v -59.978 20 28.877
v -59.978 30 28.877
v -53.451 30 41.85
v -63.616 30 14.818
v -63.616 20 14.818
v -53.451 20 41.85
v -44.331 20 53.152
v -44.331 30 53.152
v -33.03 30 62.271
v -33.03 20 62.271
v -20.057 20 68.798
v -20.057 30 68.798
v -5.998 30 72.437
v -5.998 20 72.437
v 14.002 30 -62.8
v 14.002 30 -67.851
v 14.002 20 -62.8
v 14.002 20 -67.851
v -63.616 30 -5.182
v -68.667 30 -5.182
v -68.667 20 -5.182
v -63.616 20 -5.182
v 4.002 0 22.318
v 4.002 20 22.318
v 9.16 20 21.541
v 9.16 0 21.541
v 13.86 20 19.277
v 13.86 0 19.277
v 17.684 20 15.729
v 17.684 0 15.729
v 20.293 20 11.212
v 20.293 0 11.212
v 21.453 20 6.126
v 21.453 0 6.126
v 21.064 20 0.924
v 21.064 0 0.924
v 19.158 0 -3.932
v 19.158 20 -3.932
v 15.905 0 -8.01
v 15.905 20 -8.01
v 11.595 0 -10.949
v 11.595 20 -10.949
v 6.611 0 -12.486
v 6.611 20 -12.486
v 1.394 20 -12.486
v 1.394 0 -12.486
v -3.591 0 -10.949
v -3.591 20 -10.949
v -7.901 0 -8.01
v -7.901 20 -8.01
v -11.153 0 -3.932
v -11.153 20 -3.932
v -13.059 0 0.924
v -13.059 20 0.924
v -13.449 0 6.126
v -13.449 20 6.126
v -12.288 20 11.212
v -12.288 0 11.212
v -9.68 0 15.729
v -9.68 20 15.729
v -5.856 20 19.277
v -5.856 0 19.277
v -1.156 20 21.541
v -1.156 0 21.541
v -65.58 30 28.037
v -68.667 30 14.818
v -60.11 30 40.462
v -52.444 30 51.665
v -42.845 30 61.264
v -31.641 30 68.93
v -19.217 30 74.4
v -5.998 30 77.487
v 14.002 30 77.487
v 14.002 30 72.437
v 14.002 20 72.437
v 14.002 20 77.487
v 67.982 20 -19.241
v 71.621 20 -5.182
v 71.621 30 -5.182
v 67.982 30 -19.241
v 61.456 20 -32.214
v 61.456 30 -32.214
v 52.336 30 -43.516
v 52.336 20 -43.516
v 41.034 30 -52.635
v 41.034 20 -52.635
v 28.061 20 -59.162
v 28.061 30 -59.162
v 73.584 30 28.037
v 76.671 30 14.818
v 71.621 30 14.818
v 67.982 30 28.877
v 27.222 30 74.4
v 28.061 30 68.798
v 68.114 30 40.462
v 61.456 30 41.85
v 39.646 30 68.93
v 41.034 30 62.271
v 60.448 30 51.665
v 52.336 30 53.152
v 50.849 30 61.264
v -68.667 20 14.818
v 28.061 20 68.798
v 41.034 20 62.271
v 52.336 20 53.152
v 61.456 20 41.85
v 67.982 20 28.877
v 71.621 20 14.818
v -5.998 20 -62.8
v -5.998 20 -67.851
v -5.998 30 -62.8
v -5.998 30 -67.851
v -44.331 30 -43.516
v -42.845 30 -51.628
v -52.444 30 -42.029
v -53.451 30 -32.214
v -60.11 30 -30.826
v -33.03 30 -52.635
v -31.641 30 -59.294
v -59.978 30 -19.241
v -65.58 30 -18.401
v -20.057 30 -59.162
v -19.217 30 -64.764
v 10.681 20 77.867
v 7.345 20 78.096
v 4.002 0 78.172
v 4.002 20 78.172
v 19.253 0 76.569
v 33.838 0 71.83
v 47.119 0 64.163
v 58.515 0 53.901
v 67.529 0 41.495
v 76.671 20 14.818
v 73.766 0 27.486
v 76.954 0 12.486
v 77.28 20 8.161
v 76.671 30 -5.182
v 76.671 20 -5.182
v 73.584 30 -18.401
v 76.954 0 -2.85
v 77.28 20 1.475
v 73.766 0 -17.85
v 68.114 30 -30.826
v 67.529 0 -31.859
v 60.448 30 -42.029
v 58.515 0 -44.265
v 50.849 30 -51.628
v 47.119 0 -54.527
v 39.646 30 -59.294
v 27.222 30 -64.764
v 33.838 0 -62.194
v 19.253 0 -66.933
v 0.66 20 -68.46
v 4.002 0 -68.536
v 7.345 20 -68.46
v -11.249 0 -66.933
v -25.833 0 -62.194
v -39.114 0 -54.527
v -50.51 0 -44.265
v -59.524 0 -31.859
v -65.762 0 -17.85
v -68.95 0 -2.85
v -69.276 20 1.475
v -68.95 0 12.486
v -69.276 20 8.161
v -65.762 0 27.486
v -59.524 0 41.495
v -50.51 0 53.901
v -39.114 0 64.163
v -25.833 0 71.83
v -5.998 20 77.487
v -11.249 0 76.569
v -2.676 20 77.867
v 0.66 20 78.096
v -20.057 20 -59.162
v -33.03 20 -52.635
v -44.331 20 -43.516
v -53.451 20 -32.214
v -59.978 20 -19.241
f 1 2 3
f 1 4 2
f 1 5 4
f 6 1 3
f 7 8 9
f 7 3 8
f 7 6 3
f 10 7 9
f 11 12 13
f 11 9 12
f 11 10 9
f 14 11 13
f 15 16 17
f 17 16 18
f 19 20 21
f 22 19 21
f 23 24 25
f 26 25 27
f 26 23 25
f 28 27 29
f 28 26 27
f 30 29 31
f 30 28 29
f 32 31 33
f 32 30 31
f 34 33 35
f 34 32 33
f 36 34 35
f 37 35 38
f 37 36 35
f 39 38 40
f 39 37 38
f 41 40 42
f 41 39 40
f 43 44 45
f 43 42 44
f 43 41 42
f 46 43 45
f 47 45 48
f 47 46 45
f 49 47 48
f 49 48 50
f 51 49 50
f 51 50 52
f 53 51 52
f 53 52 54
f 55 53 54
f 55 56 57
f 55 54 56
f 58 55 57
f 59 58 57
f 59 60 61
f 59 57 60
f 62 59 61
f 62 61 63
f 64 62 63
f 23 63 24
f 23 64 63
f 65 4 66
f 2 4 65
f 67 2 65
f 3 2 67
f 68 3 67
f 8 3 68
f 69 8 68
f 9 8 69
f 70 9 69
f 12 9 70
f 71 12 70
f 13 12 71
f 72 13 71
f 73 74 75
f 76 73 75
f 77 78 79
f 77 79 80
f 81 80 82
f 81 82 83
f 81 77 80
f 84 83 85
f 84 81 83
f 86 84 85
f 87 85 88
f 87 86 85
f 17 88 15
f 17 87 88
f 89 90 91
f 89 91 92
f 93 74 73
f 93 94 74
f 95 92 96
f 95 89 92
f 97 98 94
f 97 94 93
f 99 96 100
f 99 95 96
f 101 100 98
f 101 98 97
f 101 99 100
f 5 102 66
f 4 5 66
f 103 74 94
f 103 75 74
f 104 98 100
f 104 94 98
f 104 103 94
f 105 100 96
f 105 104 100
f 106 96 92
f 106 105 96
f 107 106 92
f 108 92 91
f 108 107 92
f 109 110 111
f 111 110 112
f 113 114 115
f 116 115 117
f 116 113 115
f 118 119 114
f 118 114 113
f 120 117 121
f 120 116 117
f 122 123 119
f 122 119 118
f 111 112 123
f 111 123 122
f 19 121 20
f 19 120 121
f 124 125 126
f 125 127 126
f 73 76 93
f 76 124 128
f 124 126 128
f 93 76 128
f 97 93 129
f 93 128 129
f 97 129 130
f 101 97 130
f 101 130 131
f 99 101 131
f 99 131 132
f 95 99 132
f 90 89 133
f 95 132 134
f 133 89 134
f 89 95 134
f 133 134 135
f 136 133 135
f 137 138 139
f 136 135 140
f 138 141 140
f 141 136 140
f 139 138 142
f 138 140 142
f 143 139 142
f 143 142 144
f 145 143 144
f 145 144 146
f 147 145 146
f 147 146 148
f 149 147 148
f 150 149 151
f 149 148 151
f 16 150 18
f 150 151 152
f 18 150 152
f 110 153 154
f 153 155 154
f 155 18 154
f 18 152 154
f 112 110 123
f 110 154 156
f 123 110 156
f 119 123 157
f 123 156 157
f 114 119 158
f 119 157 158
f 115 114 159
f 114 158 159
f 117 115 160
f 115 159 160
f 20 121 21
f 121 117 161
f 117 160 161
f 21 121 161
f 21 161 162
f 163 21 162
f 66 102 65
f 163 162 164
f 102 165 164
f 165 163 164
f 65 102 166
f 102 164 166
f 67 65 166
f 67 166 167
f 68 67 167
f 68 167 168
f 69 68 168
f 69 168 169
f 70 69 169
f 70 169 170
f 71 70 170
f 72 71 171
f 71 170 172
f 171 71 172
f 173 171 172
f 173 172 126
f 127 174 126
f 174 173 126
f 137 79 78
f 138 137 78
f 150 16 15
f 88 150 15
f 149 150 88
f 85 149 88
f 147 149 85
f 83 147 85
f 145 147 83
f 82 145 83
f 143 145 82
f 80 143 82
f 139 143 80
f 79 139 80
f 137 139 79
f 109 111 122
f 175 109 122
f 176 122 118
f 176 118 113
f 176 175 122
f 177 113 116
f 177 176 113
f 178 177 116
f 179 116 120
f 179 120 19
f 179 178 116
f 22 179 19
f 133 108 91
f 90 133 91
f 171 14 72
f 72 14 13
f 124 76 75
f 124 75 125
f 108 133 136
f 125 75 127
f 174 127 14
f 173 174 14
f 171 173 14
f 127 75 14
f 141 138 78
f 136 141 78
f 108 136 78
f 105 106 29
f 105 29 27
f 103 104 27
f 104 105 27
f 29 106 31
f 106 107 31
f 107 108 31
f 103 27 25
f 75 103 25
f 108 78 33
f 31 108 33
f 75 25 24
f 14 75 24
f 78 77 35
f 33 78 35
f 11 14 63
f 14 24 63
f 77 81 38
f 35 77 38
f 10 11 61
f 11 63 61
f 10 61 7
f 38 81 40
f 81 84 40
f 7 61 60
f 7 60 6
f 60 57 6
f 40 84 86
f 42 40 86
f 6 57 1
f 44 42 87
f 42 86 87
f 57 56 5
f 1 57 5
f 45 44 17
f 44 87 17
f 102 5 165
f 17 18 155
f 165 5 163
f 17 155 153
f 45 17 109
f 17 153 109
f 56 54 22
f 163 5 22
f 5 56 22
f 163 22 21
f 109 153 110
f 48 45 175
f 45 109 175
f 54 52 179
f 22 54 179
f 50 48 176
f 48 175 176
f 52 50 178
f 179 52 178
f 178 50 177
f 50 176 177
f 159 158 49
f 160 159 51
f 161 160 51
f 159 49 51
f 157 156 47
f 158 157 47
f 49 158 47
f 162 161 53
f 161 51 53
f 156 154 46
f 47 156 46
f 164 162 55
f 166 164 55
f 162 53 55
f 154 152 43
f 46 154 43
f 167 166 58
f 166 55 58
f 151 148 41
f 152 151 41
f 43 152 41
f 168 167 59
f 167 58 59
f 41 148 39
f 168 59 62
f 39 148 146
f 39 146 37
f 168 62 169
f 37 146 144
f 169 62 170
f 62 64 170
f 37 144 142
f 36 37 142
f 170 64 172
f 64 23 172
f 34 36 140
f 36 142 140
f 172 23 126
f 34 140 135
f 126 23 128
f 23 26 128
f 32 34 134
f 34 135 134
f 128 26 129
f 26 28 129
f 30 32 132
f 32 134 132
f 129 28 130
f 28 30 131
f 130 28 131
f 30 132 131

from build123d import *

# Parameters (mm, degrees)
SKETCH1_R                = 68.354
SKETCH1_R_2              = 17.5
BOSS_EXTRUDE2_DEPTH      = 20
BOSS_EXTRUDE3_DEPTH      = 10
BOSS_EXTRUDE3_DEPTH_BACK = 20
SKETCH2_R                = 73.354
SKETCH2_R_2              = 68.354
CUT_EXTRUDE1_DEPTH       = 114.995028009
CUT_EXTRUDE1_DEPTH_BACK  = 114.995028009
CUT_EXTRUDE2_DEPTH       = 114.995028009
CUT_EXTRUDE2_DEPTH_BACK  = 114.995028009


with BuildPart() as part:
    # Sketch1 → Boss-Extrude2 (new body)
    with BuildSketch(Plane(origin=(0, 0, 0), x_dir=(1, 0, 0), z_dir=(0, 1, 0))):
        with Locations(Location((4.002282363, -4.818066557, 0), (0, 0, 270))):
            Circle(SKETCH1_R)
        with Locations(Location((4.002282363, -4.818066557, 0), (0, 0, 270))):
            Circle(SKETCH1_R_2, mode=Mode.SUBTRACT)
    extrude(amount=BOSS_EXTRUDE2_DEPTH)

    # Sketch2 → Boss-Extrude3 (add, two sides: drawn at the far end of the back side and taken through both)
    with BuildSketch(Plane(origin=(0, 20, 0), x_dir=(1, 0, 0), z_dir=(0, 1, 0)).offset(-BOSS_EXTRUDE3_DEPTH_BACK)):
        with Locations(Location((4.002282363, -4.818066557, 0), (0, 0, 270))):
            Circle(SKETCH2_R)
        with Locations(Location((4.002282363, -4.818066557, 0), (0, 0, 270))):
            Circle(SKETCH2_R_2, mode=Mode.SUBTRACT)
    extrude(amount=BOSS_EXTRUDE3_DEPTH + BOSS_EXTRUDE3_DEPTH_BACK)

    # Sketch3 → Cut-Extrude1 (cut, two sides: drawn at the far end of the back side and taken through both)
    with BuildSketch(Plane(origin=(0, 0, 0), x_dir=(0, 0, -1), z_dir=(1, 0, 0)).offset(-CUT_EXTRUDE1_DEPTH_BACK)):
        Polygon((-4.818066557, 30), (5.181933443, 30), (5.181933443, 20), (-14.818066557, 20), (-14.818066557, 30), align=None)
    extrude(amount=CUT_EXTRUDE1_DEPTH + CUT_EXTRUDE1_DEPTH_BACK, mode=Mode.SUBTRACT)

    # Sketch5 → Cut-Extrude2 (cut, two sides: drawn at the far end of the back side and taken through both)
    with BuildSketch(Plane.XY.offset(-CUT_EXTRUDE2_DEPTH_BACK)):
        Polygon((4.002282363, 30), (14.002282363, 30), (14.002282363, 20), (-5.997717637, 20), (-5.997717637, 30), align=None)
    extrude(amount=CUT_EXTRUDE2_DEPTH + CUT_EXTRUDE2_DEPTH_BACK, mode=Mode.SUBTRACT)


solid = part.part
